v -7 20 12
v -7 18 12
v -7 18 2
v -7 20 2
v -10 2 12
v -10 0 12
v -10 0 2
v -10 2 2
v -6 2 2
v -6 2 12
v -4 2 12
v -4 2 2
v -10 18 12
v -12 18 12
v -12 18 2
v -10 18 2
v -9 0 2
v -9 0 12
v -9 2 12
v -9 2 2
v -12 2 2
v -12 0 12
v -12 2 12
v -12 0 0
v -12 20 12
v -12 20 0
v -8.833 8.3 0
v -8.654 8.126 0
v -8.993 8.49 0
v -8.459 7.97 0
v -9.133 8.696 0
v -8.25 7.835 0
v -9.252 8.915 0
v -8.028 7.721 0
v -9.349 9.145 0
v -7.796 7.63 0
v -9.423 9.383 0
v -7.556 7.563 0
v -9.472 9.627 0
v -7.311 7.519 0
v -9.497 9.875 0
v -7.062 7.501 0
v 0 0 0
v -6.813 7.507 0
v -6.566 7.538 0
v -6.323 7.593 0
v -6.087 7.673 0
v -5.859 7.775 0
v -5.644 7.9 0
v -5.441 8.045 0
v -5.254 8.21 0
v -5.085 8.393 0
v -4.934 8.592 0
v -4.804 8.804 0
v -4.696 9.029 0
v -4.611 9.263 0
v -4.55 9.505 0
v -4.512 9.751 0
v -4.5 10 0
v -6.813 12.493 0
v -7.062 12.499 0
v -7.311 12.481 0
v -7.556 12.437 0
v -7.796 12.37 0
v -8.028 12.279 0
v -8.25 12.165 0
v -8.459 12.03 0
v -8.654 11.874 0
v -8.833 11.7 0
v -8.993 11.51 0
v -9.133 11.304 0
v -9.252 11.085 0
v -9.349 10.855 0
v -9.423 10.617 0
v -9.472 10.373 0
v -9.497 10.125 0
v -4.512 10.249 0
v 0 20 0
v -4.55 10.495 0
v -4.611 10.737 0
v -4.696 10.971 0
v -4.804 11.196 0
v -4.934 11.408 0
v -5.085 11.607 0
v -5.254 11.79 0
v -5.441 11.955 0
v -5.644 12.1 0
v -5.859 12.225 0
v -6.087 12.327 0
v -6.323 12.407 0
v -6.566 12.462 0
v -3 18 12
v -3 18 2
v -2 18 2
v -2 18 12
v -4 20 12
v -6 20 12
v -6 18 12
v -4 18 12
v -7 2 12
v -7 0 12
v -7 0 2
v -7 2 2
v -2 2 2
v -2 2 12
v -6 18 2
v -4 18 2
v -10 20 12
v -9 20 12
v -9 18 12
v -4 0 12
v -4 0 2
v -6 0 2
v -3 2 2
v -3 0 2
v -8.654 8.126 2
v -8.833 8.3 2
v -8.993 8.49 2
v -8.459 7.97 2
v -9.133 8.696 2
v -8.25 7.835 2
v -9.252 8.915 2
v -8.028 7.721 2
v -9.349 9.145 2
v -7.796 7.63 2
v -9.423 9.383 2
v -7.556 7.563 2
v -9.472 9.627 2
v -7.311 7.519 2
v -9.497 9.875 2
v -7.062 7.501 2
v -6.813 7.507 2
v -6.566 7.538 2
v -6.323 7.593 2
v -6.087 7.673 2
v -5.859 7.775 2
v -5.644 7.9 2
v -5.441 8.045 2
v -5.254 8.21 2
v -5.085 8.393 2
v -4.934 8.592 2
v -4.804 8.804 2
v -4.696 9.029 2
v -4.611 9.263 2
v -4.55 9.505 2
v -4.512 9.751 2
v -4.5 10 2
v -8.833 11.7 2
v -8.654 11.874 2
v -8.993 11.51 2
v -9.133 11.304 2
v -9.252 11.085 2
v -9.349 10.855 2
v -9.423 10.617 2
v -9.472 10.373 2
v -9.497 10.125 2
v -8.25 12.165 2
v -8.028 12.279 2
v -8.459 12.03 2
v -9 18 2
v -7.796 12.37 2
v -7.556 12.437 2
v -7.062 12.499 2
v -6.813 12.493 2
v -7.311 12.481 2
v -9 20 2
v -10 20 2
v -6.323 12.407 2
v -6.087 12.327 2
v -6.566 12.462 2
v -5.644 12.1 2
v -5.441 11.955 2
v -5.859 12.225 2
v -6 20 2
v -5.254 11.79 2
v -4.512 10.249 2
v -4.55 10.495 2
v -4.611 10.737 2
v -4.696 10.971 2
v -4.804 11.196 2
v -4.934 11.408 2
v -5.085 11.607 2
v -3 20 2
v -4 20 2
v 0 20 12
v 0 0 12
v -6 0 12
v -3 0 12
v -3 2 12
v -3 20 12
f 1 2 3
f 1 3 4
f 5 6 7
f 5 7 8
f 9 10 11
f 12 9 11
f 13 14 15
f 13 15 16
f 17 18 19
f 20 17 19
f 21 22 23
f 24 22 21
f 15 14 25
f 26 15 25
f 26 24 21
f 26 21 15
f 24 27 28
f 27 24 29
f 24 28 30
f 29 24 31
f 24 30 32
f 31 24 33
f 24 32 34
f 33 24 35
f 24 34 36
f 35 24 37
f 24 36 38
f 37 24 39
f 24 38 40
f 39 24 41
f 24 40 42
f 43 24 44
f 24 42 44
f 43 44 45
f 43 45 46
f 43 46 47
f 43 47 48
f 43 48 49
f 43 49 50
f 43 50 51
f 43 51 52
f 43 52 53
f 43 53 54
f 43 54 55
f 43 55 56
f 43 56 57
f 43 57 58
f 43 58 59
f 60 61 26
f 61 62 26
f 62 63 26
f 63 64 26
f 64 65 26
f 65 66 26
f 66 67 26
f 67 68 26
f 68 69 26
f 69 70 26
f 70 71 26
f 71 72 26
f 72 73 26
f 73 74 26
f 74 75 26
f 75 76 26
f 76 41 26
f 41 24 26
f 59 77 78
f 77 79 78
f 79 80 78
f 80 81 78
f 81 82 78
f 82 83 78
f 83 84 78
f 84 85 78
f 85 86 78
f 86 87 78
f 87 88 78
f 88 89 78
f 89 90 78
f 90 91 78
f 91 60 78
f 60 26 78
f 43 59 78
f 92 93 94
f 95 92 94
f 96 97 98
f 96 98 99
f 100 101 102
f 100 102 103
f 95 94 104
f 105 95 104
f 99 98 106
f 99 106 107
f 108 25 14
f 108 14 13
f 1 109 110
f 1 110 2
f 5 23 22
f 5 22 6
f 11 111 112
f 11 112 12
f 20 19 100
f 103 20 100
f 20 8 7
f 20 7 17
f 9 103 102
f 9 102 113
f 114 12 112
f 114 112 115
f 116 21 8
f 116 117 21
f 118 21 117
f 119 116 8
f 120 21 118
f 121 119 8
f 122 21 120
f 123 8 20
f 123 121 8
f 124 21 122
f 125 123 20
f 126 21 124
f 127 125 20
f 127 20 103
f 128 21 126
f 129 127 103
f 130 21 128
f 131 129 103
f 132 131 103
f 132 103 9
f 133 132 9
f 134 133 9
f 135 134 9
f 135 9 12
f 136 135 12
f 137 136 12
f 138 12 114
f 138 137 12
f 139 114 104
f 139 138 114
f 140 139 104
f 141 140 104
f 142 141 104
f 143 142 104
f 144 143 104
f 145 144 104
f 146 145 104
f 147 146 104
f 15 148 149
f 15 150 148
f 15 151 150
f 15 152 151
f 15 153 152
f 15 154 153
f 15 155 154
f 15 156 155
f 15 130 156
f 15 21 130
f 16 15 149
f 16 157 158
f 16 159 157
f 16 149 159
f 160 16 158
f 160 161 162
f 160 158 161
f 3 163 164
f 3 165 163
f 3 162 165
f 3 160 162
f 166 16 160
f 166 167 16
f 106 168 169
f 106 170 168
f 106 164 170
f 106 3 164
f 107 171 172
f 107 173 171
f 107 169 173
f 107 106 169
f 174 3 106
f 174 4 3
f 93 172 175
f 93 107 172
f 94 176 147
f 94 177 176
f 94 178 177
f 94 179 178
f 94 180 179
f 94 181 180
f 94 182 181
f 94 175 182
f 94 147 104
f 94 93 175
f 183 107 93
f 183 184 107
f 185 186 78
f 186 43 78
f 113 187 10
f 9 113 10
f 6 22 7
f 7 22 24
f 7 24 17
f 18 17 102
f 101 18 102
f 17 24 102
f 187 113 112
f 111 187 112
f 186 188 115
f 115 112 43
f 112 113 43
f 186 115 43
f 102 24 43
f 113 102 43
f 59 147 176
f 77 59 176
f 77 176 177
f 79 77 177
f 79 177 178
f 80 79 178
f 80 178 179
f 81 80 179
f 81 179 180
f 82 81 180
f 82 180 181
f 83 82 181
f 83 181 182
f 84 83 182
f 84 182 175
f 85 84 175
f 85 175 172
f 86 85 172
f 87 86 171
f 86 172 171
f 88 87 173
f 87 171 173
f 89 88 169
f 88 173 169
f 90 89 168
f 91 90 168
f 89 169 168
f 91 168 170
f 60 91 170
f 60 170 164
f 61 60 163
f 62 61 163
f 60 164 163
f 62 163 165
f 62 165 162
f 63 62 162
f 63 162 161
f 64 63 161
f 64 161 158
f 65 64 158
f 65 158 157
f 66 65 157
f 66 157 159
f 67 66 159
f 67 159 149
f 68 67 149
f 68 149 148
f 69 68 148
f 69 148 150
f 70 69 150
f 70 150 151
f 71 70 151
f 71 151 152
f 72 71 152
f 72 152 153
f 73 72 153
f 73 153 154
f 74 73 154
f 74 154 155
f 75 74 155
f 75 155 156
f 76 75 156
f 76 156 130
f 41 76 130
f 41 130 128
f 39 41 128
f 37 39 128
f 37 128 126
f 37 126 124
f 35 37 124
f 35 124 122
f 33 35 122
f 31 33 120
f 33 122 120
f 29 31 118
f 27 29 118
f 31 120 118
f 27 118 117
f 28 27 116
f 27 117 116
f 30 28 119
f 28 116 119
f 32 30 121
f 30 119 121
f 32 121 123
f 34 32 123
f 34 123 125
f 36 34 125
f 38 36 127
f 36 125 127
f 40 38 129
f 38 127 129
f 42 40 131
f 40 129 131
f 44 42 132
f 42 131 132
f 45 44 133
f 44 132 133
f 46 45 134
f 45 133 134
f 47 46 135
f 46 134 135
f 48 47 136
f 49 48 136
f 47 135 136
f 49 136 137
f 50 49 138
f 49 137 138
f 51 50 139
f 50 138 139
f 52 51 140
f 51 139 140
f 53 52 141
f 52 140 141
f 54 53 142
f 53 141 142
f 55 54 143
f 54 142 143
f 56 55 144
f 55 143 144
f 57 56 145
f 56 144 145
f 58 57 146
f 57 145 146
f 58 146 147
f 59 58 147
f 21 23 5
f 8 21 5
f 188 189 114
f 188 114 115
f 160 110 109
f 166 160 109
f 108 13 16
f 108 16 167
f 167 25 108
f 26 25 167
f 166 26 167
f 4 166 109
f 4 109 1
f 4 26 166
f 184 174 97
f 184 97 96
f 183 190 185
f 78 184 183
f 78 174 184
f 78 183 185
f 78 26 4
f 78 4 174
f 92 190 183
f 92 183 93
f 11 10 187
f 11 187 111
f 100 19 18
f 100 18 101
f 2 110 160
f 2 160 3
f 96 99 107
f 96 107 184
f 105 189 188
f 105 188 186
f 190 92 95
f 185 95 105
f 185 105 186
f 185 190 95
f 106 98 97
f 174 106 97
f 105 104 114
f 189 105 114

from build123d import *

# Parameters (mm, degrees)
F0_W     = 12
F0_H     = 20
F1_DEPTH = 2
F2_W     = 2
F2_H     = 2
F2_H_2   = 8
F3_DEPTH = 10
F4_R     = 2.5
F5_DEPTH = 25
F6_DEPTH = 10


with BuildPart() as f1:
    # F0 (on Top) → F1 (new body)
    with BuildSketch(Plane.XY):
        with Locations((-6, 10)):
            Rectangle(F0_W, F0_H)
    extrude(amount=F1_DEPTH)

    # F2 (on face) → F3 (join)
    with BuildSketch(Plane.XY.offset(2)):
        with Locations((-11, 19)):
            Rectangle(F2_W, F2_H)
        Polygon((0, 20), (-3, 20), (-3, 18), (-2, 18), (0, 18), align=None)
        with Locations((-5, 19)):
            Rectangle(F2_W, F2_H)
        with Locations((-8, 19)):
            Rectangle(F2_W, F2_H)
        with Locations((-1, 14)):
            Rectangle(F2_W, F2_H_2)
        with Locations((-1, 6)):
            Rectangle(F2_W, F2_H_2)
        with Locations((-11, 1)):
            Rectangle(F2_W, F2_H)
        with Locations((-8, 1)):
            Rectangle(F2_W, F2_H)
    extrude(amount=F3_DEPTH)

    # F4 (on face) → F5 (cut)
    with BuildSketch(Plane.XY.offset(2)):
        with Locations((-7, 10)):
            Circle(F4_R)
    extrude(amount=-F5_DEPTH, mode=Mode.SUBTRACT)

    # F2 (on face) → F6 (join)
    with BuildSketch(Plane.XY.offset(2)):
        with Locations((-5, 1)):
            Rectangle(F2_W, F2_H)
        Polygon((0, 2), (-2, 2), (-3, 2), (-3, 0), (0, 0), align=None)
    extrude(amount=F6_DEPTH)


solid = f1.part
